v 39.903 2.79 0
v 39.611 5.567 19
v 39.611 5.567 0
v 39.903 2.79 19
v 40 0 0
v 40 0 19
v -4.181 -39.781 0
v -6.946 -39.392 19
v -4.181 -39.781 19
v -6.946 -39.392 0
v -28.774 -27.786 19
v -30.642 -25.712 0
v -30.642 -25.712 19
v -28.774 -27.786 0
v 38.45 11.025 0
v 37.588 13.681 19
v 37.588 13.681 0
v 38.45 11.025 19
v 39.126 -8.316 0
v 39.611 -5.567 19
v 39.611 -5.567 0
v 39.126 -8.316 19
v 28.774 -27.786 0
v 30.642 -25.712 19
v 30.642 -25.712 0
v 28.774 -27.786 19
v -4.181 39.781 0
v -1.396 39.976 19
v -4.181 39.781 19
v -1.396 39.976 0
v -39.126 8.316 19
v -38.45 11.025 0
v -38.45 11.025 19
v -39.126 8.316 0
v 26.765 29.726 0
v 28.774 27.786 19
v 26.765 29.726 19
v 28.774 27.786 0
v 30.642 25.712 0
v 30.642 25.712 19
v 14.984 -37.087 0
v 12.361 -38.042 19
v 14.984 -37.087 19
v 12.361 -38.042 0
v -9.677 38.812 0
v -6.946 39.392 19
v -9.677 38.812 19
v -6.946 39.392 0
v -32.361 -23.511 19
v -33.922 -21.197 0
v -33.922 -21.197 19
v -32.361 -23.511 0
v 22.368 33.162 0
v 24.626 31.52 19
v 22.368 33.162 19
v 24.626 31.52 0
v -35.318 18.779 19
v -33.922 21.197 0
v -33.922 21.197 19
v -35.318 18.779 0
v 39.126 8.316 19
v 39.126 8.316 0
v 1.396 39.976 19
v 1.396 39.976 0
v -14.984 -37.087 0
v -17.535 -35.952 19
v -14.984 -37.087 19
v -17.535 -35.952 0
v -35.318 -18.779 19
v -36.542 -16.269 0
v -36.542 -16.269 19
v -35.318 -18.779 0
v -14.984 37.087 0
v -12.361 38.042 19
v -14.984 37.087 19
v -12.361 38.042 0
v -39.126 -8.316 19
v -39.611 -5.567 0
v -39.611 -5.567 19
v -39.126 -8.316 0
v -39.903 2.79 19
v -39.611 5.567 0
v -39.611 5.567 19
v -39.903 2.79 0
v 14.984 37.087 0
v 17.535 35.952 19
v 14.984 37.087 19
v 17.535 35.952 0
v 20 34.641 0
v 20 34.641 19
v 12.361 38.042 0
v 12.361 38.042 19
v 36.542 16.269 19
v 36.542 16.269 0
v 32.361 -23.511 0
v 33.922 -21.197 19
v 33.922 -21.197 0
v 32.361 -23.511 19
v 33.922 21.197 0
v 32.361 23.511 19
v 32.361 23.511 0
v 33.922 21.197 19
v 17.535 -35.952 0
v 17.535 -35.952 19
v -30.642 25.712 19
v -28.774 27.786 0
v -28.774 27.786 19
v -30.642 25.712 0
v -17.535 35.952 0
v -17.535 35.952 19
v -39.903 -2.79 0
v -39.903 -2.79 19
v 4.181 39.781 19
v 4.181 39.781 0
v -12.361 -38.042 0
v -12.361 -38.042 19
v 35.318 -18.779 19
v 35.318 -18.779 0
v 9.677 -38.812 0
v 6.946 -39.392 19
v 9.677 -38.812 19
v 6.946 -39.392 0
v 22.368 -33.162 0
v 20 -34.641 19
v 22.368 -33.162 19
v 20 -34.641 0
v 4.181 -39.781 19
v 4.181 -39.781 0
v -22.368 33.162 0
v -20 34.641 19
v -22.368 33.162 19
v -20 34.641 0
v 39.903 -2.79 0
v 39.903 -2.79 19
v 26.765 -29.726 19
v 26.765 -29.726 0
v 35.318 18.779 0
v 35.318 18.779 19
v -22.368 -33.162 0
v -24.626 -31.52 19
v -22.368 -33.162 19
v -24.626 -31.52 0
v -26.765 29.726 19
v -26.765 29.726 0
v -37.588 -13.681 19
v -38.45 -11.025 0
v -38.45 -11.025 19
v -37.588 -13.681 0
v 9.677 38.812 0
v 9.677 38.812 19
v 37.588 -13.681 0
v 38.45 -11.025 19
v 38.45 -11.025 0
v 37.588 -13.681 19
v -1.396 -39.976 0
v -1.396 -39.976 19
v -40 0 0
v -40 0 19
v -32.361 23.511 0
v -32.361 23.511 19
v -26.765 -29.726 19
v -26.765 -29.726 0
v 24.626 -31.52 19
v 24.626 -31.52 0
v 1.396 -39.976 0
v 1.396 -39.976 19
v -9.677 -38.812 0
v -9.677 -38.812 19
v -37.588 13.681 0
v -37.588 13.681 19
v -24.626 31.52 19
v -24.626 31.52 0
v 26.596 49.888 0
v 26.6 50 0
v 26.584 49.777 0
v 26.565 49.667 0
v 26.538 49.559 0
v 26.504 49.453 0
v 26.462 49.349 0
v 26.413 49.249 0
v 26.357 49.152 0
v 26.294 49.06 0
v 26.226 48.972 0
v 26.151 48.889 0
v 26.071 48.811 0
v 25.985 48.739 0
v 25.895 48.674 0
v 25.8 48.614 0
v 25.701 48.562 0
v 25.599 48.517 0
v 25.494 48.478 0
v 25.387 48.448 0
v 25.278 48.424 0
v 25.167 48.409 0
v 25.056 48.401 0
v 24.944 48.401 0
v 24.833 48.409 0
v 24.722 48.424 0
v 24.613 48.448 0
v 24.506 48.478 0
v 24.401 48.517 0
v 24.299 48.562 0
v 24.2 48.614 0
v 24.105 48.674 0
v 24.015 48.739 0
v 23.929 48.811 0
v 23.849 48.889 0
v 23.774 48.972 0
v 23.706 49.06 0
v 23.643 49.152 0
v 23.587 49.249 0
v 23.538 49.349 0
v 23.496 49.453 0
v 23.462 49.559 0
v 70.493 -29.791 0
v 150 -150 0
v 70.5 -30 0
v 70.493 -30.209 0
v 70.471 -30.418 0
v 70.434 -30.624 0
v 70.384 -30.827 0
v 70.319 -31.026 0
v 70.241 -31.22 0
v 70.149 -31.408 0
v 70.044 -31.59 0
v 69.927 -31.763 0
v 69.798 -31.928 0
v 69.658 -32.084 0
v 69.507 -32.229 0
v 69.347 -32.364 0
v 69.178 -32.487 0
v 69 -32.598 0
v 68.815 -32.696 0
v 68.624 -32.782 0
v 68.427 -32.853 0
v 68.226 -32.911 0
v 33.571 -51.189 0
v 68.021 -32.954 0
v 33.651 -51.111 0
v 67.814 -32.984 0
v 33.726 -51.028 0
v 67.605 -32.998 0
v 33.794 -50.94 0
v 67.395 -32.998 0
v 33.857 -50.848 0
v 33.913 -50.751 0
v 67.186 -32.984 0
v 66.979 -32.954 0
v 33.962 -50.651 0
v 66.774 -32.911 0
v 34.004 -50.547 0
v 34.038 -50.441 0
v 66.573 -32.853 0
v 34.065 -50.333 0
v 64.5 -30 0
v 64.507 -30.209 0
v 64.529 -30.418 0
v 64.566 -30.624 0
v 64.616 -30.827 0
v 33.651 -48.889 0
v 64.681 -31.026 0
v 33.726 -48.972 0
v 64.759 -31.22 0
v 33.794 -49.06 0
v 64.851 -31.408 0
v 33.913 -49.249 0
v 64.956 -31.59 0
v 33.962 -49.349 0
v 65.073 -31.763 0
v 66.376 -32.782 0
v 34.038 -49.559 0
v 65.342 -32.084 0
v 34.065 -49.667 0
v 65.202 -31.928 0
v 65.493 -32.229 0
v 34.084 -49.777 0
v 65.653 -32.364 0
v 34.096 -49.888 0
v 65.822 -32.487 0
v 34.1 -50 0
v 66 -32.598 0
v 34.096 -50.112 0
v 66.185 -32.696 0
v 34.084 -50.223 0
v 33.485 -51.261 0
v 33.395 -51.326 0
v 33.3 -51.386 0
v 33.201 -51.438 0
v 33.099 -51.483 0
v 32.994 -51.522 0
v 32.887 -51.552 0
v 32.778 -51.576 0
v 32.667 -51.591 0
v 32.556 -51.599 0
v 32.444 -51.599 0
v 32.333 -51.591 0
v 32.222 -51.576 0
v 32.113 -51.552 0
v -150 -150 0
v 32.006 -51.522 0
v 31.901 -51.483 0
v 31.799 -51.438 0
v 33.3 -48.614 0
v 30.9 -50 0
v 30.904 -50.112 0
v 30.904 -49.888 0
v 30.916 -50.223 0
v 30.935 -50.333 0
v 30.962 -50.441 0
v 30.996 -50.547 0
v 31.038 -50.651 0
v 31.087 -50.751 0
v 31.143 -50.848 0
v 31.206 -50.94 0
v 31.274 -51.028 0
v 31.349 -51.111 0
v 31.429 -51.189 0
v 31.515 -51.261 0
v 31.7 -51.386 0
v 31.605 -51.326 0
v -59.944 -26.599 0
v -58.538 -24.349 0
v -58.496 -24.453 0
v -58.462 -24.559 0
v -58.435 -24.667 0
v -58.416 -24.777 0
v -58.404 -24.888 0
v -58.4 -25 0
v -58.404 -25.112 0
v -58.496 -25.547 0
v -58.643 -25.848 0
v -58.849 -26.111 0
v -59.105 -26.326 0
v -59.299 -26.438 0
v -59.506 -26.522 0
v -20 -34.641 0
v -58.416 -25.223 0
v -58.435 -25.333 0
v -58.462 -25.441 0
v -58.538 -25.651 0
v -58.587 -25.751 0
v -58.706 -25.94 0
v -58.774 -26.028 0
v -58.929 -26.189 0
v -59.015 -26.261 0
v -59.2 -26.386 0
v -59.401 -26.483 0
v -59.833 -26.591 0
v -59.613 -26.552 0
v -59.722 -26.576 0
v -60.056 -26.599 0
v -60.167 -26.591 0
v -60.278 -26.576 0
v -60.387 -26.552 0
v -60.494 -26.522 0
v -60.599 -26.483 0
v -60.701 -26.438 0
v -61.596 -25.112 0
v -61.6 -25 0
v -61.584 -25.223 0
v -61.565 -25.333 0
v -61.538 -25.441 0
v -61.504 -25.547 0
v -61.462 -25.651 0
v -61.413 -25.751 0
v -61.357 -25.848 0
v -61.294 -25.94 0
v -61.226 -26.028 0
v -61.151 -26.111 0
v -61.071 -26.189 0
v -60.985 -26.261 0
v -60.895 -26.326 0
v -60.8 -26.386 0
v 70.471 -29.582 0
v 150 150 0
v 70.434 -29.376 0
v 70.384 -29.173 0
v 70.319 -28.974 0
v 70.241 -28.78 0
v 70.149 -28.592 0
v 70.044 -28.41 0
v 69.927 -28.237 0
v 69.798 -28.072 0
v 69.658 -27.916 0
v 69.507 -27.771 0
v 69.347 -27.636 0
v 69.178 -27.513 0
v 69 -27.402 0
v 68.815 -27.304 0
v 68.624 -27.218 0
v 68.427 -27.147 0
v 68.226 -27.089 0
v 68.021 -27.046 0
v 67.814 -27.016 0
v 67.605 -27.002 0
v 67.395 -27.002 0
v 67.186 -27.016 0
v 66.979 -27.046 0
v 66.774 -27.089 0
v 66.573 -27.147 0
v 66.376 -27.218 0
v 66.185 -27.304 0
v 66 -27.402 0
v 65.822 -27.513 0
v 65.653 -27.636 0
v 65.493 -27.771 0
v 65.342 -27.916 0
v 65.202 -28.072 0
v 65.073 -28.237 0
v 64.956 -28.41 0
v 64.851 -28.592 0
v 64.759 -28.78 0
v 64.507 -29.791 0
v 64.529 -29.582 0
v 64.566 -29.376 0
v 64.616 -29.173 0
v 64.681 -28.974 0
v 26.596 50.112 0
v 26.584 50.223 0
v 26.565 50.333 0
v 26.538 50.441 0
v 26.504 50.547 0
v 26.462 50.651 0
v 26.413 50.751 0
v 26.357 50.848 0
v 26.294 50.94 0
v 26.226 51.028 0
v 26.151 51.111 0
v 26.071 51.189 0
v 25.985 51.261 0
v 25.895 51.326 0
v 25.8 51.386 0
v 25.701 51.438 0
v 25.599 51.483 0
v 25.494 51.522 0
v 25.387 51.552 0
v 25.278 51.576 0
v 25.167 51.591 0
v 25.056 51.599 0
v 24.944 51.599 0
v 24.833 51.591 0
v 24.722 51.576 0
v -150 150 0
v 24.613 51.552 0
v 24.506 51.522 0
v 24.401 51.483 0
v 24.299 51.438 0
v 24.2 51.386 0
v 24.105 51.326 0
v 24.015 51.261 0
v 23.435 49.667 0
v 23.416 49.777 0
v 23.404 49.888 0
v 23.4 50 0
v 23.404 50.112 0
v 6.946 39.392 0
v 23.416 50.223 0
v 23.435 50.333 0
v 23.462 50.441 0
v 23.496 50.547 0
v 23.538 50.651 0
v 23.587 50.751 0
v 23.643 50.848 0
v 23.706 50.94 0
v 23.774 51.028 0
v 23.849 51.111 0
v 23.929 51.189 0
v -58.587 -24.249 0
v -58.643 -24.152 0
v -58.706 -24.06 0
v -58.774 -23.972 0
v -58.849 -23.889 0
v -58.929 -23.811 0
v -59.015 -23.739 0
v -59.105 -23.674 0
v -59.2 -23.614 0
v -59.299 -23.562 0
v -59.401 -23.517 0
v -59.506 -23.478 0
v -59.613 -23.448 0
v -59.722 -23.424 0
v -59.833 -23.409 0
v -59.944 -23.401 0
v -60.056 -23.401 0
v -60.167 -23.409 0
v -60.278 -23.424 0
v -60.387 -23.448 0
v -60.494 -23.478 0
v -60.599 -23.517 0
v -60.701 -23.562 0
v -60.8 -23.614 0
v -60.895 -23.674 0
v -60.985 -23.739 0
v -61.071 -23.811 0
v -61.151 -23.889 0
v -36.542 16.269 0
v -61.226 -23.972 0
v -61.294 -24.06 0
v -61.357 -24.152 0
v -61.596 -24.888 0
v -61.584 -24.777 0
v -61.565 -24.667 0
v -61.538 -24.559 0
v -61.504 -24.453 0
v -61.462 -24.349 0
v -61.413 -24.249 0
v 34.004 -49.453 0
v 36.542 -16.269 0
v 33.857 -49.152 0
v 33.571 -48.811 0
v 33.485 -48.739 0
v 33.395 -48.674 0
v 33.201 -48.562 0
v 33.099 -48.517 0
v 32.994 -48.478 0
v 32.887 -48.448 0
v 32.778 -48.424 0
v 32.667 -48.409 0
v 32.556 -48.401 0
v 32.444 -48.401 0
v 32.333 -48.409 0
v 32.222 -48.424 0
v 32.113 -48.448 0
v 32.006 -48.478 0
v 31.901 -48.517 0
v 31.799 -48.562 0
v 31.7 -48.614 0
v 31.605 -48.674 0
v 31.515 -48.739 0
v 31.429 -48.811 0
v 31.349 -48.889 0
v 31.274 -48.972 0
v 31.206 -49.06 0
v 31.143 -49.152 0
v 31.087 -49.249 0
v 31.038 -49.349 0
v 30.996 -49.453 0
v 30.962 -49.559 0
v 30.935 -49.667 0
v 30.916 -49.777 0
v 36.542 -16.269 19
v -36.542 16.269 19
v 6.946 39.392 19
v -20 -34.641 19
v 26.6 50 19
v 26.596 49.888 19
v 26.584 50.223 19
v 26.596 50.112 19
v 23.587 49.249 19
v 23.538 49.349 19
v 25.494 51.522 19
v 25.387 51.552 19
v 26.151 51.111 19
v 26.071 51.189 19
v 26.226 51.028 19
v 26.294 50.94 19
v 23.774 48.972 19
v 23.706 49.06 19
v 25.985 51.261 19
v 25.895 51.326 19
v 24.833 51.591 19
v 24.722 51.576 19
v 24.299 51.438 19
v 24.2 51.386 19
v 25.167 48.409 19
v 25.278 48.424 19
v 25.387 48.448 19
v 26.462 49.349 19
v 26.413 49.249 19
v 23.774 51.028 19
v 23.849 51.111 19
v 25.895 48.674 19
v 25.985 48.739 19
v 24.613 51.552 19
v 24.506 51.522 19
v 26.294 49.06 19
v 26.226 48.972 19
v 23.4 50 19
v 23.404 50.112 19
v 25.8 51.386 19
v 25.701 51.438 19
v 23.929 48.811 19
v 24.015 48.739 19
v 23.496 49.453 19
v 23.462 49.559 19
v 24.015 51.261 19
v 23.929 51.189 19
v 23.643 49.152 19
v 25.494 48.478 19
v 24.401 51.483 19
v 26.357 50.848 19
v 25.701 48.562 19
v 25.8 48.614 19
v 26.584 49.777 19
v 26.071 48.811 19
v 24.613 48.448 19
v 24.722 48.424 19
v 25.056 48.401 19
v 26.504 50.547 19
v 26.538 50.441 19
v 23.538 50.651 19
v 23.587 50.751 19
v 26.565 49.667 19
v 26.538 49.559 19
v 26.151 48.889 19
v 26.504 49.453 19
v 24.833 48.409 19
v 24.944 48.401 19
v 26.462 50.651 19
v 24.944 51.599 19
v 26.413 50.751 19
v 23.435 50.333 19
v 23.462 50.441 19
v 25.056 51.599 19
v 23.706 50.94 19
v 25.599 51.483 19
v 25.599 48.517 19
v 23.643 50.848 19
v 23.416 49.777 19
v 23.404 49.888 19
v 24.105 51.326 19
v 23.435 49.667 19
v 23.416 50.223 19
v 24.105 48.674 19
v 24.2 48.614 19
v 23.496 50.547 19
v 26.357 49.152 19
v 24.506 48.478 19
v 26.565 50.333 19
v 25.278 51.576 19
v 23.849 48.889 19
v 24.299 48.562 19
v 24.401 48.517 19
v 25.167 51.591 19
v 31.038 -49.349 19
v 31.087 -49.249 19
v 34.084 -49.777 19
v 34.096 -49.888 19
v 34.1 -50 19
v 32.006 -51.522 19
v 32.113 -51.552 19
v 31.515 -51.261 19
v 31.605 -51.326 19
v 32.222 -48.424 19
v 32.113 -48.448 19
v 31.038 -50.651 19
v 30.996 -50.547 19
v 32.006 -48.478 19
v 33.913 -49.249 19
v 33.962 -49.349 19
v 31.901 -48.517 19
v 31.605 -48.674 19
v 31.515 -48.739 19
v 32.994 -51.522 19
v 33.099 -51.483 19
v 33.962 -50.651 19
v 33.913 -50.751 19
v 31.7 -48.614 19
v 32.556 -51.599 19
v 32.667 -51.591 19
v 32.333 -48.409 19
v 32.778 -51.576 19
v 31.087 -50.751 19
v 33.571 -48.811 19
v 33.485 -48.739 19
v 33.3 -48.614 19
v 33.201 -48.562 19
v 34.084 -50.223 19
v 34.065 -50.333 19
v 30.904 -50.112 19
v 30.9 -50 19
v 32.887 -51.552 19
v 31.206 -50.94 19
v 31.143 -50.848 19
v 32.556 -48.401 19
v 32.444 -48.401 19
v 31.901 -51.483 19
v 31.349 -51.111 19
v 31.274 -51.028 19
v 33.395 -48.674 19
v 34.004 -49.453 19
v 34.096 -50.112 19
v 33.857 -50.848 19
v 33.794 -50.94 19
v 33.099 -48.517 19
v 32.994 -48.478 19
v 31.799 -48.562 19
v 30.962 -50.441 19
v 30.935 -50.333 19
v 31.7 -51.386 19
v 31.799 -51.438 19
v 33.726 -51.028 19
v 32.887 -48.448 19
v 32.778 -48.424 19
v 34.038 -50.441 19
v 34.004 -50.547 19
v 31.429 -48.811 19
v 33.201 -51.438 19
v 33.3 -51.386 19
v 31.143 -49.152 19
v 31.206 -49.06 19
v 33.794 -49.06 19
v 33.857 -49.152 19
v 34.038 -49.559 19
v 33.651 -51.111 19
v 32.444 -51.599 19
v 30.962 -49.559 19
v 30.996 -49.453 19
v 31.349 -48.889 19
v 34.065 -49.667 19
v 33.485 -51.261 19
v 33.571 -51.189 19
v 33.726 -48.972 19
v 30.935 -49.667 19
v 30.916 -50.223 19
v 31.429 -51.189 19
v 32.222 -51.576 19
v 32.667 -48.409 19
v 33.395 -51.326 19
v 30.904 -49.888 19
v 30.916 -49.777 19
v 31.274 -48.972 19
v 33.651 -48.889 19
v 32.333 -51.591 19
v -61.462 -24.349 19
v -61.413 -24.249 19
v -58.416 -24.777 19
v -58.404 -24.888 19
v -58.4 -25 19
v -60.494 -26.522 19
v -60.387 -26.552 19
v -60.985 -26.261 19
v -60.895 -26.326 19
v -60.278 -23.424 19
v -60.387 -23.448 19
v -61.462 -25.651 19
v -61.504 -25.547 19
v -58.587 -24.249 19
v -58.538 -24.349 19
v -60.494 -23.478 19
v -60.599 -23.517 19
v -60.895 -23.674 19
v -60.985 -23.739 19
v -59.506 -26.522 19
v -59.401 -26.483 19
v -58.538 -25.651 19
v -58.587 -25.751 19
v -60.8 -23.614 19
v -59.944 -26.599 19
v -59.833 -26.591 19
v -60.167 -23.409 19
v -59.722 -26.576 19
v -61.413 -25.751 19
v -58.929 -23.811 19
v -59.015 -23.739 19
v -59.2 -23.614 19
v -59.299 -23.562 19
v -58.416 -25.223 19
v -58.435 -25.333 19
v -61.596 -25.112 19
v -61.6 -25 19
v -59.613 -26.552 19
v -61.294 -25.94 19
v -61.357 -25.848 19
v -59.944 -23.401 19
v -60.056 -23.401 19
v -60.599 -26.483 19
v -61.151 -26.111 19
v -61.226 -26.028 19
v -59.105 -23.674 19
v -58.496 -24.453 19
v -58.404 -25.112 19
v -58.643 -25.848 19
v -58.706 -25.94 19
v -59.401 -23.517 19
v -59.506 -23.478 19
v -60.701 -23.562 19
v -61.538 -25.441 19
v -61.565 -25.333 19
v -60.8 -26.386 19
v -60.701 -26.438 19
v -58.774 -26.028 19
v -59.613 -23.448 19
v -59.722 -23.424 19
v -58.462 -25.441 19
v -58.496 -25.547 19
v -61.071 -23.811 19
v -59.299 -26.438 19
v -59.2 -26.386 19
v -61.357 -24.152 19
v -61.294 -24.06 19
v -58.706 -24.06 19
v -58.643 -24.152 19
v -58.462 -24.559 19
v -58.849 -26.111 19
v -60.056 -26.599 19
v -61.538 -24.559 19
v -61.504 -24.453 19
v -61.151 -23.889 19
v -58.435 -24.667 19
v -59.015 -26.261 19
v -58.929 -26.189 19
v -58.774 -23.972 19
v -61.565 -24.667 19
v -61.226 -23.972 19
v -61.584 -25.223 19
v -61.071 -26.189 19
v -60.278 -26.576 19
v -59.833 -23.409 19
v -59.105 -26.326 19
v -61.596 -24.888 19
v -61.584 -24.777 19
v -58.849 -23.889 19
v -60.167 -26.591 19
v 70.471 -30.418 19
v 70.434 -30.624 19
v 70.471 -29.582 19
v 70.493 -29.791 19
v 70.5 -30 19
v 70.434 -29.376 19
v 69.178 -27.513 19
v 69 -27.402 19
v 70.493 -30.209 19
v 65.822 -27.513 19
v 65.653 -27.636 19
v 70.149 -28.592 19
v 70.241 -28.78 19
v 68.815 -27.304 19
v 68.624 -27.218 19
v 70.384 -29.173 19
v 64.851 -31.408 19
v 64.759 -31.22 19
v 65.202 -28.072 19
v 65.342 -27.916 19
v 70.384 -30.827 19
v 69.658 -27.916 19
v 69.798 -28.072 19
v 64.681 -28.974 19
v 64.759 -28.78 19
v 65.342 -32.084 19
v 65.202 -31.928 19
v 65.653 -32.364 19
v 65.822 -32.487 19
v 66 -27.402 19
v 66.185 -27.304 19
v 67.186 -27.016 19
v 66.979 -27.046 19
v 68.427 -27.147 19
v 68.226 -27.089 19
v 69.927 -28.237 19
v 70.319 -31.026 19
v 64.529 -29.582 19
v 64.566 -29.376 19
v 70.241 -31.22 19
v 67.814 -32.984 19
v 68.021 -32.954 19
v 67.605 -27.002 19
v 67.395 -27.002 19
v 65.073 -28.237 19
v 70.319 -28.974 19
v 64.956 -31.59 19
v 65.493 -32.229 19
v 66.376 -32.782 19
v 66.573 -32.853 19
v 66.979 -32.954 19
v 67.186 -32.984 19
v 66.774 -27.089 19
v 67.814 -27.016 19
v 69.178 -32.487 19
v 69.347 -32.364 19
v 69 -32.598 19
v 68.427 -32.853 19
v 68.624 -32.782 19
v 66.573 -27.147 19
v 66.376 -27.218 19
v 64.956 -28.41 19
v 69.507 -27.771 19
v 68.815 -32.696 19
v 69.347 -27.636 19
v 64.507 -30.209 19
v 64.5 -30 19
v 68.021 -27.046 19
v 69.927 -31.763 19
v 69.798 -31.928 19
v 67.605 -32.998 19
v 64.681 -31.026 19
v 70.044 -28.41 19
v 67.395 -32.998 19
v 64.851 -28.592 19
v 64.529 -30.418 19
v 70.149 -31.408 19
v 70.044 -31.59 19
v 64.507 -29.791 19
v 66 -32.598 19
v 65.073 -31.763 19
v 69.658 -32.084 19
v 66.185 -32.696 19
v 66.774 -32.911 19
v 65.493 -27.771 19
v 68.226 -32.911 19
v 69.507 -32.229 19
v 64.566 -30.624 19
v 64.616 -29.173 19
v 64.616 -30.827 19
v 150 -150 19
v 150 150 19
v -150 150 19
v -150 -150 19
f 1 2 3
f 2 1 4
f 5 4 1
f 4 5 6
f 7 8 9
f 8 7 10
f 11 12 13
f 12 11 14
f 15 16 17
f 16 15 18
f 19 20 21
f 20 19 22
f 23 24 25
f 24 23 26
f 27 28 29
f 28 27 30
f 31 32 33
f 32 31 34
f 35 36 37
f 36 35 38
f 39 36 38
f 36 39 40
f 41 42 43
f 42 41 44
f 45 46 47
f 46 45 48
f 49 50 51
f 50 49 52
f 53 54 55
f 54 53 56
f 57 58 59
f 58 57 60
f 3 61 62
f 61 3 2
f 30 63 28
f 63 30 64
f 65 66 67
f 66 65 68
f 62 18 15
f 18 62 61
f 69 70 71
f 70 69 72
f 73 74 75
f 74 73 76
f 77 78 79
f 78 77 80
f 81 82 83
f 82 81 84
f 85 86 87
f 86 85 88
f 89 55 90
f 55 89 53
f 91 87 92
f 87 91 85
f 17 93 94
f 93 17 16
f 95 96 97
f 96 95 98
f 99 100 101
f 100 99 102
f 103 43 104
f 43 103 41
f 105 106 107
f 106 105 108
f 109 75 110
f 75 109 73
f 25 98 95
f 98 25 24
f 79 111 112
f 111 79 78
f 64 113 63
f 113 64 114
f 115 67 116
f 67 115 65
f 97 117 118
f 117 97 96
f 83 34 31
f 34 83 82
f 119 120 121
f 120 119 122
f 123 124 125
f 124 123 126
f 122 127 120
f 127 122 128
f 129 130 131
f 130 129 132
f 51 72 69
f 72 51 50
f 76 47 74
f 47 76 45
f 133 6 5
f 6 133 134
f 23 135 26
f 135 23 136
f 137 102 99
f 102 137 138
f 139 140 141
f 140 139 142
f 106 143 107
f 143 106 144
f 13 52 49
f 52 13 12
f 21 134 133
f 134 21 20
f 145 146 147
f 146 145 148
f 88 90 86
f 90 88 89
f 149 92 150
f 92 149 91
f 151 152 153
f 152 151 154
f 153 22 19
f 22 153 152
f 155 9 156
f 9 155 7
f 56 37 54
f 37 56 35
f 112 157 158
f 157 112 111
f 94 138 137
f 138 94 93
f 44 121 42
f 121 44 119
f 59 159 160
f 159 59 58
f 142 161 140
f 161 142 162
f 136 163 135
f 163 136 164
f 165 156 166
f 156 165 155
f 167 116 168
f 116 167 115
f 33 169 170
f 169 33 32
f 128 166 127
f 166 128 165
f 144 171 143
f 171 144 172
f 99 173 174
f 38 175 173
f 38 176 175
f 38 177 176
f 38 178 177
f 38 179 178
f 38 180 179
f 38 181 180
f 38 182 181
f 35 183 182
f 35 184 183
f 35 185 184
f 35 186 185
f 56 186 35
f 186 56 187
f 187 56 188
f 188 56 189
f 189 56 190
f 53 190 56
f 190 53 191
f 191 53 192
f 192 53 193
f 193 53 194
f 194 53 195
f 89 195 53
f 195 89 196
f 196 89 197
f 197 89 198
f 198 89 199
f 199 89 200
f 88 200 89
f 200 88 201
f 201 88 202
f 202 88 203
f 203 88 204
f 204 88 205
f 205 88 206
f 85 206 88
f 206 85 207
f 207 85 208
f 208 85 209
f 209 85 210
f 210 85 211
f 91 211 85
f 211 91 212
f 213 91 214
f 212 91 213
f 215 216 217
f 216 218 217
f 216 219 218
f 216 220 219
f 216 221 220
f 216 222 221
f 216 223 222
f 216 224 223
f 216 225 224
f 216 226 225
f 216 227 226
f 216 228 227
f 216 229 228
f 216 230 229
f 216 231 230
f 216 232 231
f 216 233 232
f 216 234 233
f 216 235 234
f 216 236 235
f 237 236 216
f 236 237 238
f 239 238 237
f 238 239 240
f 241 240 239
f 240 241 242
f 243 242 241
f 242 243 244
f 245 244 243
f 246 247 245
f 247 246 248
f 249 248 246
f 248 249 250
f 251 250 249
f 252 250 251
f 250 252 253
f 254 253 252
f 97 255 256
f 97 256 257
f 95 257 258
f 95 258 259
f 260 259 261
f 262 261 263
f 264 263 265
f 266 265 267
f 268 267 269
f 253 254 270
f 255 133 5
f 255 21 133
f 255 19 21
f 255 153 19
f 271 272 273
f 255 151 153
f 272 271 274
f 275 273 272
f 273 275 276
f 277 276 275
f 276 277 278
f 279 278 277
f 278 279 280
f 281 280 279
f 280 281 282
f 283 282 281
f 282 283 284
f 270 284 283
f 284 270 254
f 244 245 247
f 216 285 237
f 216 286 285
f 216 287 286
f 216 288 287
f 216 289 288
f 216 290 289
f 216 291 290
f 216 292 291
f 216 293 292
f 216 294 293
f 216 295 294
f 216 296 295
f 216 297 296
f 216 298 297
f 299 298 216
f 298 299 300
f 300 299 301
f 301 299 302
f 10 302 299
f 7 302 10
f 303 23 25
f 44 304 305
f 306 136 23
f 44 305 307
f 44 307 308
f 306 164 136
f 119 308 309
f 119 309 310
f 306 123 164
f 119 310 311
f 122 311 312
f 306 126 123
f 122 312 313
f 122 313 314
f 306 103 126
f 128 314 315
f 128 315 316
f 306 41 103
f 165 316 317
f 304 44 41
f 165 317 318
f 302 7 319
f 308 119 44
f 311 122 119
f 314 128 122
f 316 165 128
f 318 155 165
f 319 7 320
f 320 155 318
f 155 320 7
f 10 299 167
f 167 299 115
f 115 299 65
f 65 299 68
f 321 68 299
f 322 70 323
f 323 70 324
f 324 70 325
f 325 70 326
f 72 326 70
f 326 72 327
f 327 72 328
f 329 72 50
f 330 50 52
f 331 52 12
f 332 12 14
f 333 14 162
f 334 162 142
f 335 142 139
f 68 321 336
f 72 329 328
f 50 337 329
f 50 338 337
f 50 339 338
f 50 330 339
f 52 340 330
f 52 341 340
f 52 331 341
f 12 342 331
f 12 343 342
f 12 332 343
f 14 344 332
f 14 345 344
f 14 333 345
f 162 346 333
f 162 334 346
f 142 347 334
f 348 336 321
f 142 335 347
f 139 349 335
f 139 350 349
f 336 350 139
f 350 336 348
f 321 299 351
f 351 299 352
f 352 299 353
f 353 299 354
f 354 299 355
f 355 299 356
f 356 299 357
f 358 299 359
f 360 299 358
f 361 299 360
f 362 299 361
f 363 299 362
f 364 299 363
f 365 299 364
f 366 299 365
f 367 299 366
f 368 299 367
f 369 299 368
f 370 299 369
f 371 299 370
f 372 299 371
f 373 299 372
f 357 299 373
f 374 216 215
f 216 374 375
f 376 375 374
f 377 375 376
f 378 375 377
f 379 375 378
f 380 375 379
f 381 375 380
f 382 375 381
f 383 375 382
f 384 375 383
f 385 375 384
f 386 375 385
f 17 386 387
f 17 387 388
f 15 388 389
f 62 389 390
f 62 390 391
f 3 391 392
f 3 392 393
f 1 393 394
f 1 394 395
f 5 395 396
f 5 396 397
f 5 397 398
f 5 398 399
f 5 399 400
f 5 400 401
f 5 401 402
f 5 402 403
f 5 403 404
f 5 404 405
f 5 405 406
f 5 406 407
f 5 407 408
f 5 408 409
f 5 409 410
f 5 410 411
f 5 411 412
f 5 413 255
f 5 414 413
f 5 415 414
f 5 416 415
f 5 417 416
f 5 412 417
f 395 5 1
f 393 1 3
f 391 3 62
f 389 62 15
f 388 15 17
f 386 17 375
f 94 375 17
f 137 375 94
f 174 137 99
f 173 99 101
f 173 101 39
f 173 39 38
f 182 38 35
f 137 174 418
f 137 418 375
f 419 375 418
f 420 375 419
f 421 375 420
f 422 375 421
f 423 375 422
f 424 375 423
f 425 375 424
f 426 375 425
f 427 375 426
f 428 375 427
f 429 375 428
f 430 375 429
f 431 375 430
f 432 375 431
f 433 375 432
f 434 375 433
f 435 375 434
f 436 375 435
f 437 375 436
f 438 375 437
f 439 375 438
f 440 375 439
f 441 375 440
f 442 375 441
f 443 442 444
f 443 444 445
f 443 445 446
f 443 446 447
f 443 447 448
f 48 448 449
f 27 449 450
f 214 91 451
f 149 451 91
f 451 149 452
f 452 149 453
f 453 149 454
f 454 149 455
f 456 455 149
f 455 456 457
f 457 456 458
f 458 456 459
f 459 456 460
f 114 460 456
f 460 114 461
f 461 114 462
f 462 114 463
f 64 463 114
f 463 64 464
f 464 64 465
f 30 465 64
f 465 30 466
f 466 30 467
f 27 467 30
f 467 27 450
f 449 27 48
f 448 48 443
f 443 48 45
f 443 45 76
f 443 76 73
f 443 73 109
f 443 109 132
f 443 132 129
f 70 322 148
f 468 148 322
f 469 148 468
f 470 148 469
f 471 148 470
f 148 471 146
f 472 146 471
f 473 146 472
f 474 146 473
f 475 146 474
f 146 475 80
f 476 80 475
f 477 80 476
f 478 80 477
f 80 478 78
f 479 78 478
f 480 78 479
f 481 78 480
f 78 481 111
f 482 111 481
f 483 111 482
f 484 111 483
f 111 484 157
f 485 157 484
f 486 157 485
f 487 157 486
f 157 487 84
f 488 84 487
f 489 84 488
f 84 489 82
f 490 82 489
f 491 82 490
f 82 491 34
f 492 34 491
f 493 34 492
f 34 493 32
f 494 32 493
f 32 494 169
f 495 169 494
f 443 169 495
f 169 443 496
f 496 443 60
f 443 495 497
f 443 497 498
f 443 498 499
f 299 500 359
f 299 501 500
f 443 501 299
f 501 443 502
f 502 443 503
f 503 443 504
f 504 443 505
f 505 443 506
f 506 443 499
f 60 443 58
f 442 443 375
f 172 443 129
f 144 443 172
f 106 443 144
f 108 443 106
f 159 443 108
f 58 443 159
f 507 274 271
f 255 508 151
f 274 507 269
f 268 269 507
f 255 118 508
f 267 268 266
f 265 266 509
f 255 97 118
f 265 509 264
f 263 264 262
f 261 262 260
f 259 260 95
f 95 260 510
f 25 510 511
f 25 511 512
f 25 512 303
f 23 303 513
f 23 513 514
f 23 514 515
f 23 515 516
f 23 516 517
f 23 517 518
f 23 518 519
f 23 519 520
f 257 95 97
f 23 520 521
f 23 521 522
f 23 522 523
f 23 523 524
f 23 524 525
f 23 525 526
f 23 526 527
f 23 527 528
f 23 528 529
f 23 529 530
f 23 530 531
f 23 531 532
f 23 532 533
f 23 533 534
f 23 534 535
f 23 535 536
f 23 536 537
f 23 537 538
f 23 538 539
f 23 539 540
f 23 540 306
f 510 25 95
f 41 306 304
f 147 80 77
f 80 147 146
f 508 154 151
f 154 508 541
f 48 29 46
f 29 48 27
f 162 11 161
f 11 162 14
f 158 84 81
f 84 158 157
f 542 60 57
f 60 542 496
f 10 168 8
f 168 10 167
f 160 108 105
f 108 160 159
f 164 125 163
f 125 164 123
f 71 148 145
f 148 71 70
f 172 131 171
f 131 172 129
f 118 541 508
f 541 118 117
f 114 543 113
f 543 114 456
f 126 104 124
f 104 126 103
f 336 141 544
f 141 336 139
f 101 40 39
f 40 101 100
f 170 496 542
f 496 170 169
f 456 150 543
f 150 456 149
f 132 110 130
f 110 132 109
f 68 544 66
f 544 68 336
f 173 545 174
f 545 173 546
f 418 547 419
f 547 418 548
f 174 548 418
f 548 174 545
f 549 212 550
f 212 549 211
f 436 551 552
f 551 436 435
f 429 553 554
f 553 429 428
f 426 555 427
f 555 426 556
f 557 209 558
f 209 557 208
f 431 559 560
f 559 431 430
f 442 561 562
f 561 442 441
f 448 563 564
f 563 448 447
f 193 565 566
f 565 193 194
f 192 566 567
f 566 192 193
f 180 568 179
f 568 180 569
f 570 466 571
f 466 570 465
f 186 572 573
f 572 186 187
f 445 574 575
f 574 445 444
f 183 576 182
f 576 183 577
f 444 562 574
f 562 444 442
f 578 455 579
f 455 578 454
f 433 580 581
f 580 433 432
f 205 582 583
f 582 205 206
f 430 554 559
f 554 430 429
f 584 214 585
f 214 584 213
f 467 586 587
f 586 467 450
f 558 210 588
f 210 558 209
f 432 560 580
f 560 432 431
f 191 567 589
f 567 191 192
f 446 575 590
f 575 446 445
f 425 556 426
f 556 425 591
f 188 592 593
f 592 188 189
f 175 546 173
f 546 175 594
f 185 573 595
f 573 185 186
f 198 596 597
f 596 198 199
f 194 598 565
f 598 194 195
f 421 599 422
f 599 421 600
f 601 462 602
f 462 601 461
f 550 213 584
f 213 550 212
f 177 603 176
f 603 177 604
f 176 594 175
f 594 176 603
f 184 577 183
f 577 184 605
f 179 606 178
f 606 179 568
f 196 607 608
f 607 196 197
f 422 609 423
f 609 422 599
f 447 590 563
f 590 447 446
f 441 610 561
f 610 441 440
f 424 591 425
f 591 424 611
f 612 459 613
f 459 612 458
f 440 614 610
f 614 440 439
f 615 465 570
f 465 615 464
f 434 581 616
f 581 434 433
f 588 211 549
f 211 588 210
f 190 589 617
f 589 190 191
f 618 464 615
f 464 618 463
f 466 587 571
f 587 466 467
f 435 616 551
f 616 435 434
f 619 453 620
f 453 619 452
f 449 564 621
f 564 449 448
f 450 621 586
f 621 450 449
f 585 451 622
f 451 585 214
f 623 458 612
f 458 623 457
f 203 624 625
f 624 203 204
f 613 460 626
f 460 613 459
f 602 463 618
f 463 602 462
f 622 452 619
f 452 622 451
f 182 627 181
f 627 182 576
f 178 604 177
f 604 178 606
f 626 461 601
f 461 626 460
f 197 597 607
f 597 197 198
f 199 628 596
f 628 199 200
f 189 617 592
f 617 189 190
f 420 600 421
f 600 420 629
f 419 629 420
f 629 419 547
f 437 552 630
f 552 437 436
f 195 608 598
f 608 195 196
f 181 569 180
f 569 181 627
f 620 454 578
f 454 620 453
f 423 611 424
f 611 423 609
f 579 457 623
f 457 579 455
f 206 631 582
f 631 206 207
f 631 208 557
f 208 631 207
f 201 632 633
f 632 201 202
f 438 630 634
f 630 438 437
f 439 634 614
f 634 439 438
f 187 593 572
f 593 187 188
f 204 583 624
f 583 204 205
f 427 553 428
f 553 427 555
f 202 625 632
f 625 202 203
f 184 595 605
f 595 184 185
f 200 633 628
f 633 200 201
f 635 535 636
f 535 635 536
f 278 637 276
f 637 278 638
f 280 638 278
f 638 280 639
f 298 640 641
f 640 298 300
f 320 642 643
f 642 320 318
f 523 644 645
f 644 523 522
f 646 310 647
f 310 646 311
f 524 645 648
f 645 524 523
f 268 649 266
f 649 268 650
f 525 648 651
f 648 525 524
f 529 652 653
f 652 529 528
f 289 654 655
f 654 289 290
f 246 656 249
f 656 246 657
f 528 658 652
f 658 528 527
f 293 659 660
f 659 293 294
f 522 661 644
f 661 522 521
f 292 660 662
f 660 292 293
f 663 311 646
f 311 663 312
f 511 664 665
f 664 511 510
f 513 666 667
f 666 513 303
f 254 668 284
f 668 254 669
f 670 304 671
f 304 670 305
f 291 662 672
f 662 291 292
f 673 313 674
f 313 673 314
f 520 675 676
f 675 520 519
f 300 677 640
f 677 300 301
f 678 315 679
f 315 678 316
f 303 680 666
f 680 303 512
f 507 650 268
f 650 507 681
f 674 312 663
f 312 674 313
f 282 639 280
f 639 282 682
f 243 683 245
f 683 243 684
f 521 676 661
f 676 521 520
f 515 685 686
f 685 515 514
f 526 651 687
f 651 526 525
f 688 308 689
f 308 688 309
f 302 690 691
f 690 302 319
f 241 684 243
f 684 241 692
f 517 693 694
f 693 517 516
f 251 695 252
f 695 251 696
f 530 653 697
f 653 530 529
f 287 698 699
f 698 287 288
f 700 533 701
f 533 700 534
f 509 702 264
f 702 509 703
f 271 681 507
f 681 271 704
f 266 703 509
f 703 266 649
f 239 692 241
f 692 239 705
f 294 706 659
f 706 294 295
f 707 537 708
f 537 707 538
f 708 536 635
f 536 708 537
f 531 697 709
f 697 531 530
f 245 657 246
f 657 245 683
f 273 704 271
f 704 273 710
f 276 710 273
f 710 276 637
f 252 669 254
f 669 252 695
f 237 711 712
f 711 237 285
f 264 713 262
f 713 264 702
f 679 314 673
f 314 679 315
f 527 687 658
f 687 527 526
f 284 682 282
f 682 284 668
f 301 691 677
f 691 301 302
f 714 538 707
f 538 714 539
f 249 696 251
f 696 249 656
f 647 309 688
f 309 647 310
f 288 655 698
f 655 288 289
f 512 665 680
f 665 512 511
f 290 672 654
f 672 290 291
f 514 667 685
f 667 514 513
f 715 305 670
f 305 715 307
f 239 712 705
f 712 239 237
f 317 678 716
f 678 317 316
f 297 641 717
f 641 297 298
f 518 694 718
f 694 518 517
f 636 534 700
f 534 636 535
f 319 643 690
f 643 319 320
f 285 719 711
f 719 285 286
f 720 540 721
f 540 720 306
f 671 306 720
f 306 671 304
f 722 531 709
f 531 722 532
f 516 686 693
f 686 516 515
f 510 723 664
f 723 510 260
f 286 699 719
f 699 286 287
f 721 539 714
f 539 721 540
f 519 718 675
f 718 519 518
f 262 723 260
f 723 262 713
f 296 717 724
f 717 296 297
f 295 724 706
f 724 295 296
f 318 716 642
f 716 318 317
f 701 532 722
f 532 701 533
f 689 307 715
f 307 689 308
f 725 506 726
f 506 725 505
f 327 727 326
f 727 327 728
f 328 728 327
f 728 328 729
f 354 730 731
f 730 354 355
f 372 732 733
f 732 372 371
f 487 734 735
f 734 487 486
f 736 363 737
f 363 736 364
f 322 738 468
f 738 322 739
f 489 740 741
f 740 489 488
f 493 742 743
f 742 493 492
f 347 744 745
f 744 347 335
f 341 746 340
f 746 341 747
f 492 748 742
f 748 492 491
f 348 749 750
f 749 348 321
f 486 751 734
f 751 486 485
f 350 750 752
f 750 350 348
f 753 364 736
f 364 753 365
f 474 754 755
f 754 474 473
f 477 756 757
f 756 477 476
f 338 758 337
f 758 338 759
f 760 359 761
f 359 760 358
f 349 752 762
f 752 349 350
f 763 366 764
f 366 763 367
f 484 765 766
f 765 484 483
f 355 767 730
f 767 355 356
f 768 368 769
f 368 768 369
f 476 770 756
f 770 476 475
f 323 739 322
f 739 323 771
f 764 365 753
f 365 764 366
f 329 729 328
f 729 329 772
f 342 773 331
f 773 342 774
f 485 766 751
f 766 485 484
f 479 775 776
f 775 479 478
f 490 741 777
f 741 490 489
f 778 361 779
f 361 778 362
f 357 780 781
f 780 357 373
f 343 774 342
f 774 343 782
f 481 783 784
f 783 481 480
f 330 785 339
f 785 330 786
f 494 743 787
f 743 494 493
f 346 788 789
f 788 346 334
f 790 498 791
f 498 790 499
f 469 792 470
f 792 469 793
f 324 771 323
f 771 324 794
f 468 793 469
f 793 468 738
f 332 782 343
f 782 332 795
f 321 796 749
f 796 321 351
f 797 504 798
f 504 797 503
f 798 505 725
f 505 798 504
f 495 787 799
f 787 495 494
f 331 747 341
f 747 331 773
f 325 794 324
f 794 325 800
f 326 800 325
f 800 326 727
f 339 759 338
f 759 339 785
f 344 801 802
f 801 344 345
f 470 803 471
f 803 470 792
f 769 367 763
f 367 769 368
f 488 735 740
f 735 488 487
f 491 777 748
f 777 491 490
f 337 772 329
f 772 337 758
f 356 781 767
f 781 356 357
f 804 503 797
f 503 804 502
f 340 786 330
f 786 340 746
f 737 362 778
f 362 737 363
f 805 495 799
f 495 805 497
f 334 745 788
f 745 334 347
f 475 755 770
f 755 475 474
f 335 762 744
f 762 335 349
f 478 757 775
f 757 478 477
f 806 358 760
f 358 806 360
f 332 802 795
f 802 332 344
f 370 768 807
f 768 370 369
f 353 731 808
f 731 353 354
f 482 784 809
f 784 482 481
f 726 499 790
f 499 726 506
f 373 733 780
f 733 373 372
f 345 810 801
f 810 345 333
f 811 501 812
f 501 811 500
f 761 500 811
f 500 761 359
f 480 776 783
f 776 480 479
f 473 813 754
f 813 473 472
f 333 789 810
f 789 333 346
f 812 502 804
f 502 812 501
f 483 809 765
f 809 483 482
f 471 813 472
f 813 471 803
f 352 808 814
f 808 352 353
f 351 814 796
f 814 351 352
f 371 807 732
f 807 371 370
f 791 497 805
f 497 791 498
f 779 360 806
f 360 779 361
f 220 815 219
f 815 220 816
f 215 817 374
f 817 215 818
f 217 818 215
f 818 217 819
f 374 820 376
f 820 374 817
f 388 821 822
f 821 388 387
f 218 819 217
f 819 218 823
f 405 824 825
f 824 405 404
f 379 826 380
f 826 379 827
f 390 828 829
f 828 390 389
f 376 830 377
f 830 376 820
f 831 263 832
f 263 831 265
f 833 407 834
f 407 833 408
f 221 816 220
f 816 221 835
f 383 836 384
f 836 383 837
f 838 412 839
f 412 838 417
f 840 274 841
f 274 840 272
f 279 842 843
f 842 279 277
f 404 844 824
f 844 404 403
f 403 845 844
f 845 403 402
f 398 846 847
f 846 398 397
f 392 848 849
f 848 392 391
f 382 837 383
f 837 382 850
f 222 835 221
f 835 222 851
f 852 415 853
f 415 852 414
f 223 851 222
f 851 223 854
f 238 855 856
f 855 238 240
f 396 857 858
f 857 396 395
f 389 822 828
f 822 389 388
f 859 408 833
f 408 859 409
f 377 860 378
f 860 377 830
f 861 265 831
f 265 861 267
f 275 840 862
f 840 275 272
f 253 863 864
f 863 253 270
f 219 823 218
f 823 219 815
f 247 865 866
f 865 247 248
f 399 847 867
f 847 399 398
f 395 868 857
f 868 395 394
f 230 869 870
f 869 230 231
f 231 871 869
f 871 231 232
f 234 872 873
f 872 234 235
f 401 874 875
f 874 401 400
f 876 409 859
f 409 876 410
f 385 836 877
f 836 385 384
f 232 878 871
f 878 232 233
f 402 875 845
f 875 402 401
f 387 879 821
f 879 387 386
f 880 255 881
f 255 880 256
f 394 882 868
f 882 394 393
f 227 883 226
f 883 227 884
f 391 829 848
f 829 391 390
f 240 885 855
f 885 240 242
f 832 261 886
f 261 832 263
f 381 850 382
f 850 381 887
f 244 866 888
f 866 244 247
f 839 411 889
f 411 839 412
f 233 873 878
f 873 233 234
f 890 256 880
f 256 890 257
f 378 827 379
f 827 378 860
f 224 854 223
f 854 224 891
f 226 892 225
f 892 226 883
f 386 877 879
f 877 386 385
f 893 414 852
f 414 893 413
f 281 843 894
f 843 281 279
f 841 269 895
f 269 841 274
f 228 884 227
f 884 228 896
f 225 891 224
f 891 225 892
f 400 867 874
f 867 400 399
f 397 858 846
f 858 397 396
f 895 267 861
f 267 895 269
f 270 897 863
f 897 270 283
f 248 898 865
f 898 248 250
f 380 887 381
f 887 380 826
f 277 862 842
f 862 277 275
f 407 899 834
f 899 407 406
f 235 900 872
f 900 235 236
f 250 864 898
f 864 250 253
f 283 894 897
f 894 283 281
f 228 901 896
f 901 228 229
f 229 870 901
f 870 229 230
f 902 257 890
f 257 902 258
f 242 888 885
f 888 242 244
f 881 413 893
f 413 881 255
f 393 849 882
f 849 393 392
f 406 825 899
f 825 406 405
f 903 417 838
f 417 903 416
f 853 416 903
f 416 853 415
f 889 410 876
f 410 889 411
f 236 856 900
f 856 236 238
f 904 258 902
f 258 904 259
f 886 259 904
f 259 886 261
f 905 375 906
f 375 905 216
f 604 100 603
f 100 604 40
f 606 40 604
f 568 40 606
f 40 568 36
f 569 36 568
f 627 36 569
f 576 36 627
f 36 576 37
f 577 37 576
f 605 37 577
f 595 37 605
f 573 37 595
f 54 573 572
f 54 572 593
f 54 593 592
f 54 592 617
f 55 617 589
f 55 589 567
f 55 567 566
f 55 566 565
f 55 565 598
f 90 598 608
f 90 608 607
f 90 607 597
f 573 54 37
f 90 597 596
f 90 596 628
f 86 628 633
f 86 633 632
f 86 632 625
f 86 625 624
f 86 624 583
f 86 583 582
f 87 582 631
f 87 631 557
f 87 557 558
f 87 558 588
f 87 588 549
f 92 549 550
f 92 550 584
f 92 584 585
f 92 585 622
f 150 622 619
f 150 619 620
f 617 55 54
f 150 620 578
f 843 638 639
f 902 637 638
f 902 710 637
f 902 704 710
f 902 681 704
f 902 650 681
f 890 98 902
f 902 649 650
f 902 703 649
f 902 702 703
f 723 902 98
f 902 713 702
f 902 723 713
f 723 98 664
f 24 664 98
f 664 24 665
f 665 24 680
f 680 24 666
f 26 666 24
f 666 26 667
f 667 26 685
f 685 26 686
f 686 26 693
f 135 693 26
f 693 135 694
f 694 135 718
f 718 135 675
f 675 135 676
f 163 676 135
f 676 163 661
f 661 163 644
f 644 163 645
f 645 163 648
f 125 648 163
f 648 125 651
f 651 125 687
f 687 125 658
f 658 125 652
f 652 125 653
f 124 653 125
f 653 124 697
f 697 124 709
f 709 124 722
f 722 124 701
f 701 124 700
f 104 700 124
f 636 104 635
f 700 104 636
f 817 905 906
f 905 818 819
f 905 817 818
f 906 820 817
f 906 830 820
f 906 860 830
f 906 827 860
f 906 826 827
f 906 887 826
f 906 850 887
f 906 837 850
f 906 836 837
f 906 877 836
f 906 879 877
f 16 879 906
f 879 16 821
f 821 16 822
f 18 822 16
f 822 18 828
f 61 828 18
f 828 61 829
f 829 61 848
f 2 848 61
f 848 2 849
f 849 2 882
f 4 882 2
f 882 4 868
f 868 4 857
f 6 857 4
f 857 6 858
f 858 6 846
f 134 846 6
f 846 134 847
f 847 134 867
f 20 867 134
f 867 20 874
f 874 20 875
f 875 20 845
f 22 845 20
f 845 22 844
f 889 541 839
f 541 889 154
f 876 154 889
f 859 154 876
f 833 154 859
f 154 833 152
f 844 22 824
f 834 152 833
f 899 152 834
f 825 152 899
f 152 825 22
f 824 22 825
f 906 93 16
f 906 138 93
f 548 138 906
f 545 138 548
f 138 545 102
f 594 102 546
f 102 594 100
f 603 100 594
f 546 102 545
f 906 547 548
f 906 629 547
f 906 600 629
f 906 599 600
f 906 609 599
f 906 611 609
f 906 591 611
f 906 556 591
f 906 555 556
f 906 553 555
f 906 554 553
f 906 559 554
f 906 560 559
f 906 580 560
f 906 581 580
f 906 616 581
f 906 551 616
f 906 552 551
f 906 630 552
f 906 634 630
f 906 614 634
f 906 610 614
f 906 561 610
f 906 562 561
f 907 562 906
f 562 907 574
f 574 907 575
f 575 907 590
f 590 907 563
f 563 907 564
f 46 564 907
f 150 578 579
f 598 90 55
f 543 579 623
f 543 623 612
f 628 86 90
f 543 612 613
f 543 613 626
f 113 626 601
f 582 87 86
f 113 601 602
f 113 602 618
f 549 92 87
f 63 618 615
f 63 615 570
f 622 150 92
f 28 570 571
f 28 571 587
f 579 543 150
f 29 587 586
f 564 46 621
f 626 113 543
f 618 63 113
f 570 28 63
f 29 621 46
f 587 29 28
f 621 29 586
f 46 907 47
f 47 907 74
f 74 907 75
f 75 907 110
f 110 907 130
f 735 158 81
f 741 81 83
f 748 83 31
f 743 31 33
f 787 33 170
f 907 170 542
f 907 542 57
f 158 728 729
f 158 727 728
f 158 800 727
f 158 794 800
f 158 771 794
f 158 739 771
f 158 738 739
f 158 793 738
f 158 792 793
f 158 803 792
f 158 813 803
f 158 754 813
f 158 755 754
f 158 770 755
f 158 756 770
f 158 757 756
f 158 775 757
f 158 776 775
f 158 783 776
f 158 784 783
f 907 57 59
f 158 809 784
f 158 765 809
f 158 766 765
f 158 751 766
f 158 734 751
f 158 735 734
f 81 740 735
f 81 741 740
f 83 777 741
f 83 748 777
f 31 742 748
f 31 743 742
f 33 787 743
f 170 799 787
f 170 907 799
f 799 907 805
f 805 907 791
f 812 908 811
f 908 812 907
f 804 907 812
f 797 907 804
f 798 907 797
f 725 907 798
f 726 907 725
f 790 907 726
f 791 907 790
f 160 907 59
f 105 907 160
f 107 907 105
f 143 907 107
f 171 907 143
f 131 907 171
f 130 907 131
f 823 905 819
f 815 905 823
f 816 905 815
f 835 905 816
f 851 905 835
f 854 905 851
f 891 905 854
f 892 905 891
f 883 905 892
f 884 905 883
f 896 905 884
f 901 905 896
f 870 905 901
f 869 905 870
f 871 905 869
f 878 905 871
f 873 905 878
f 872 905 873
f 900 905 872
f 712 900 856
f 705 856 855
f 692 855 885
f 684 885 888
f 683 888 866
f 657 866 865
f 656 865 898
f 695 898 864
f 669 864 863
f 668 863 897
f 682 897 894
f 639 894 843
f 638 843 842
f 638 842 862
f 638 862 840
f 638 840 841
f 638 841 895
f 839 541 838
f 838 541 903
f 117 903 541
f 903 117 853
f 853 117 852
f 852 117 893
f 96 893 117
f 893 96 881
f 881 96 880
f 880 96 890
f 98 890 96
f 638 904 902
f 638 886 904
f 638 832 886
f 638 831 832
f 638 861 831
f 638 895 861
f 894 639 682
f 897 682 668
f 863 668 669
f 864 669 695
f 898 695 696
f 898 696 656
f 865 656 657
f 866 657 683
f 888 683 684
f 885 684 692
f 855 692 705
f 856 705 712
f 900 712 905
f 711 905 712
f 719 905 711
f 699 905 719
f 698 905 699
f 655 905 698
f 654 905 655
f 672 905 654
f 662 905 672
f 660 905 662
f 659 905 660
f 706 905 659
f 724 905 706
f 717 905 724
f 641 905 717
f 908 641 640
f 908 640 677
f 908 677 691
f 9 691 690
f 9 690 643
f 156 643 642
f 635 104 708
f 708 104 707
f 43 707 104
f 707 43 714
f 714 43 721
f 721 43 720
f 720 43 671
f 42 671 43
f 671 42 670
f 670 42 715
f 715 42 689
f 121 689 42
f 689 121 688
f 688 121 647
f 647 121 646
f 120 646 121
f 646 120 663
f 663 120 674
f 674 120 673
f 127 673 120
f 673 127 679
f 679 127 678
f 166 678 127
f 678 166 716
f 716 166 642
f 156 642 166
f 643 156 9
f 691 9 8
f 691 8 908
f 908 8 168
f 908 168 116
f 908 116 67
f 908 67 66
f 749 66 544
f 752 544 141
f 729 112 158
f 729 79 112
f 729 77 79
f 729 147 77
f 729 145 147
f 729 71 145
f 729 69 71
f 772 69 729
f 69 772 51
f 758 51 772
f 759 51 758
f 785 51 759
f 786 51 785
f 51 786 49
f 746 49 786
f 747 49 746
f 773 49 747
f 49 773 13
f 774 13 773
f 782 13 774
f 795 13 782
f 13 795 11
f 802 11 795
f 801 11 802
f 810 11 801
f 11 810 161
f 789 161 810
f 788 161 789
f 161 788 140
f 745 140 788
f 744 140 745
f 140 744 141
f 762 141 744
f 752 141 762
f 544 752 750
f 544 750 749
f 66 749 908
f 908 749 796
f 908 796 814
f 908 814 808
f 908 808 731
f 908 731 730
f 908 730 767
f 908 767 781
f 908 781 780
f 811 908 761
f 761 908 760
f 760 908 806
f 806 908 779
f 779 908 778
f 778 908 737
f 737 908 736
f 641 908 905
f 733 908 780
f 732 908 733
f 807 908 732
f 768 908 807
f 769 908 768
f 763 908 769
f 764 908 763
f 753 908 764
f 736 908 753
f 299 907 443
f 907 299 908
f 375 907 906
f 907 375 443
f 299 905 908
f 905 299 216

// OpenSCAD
// file: insert.scad
/*
    Insert
*/

module insert(thicknessMaterial){
width = 300;
depth = 300;

translate([
    -width/2,
    -depth/2,
    0])
cube([
    width,
    depth,
    thicknessMaterial]);
}


insert(19);
// main file
/*
    Insert Router
*/

use <insert.scad>

module insertRouter(thicknessMaterial){
$fn=90;  // accuracy

/*
    P = position from middle
    W = From width
    D = From Depth
*/

width = 300;
depth = 300;

holeDiameter = 3.2;
routerDiamter = 80;
adjustmentDiamter = 6;

hole1PW = 25;
hole1PD = 50;
hole2PW = 32.5;
hole2PD = -50;
hole3PW = -60;
hole3PD = -25;

adjustmentPW = 67.5;
adjustmentPD = -30;

color("grey")
difference () {


translate([0,0,0])    
insert(thicknessMaterial);
    

union () {
    
// Hole Router
cylinder(
    h = thicknessMaterial+2,
    d = routerDiamter
    );

// Hole 1
translate([hole1PW,
    hole1PD,
    -1])
cylinder(
    h = thicknessMaterial+2,
    d = holeDiameter
    );
    
// Hole 2
translate([hole2PW,
    hole2PD,
    -1])
cylinder(
    h = thicknessMaterial+2,
    d = holeDiameter
    );

// Hole 3
translate([hole3PW,
    hole3PD,
    -1])
cylinder(
    h = thicknessMaterial+2,
    d = holeDiameter
    );

// Adjustment
translate([adjustmentPW,
    adjustmentPD,
    -1])
cylinder(
    h = thicknessMaterial+2,
    d = adjustmentDiamter
    );
}}}

thicknessMaterial = 19;
insertRouter(thicknessMaterial);
